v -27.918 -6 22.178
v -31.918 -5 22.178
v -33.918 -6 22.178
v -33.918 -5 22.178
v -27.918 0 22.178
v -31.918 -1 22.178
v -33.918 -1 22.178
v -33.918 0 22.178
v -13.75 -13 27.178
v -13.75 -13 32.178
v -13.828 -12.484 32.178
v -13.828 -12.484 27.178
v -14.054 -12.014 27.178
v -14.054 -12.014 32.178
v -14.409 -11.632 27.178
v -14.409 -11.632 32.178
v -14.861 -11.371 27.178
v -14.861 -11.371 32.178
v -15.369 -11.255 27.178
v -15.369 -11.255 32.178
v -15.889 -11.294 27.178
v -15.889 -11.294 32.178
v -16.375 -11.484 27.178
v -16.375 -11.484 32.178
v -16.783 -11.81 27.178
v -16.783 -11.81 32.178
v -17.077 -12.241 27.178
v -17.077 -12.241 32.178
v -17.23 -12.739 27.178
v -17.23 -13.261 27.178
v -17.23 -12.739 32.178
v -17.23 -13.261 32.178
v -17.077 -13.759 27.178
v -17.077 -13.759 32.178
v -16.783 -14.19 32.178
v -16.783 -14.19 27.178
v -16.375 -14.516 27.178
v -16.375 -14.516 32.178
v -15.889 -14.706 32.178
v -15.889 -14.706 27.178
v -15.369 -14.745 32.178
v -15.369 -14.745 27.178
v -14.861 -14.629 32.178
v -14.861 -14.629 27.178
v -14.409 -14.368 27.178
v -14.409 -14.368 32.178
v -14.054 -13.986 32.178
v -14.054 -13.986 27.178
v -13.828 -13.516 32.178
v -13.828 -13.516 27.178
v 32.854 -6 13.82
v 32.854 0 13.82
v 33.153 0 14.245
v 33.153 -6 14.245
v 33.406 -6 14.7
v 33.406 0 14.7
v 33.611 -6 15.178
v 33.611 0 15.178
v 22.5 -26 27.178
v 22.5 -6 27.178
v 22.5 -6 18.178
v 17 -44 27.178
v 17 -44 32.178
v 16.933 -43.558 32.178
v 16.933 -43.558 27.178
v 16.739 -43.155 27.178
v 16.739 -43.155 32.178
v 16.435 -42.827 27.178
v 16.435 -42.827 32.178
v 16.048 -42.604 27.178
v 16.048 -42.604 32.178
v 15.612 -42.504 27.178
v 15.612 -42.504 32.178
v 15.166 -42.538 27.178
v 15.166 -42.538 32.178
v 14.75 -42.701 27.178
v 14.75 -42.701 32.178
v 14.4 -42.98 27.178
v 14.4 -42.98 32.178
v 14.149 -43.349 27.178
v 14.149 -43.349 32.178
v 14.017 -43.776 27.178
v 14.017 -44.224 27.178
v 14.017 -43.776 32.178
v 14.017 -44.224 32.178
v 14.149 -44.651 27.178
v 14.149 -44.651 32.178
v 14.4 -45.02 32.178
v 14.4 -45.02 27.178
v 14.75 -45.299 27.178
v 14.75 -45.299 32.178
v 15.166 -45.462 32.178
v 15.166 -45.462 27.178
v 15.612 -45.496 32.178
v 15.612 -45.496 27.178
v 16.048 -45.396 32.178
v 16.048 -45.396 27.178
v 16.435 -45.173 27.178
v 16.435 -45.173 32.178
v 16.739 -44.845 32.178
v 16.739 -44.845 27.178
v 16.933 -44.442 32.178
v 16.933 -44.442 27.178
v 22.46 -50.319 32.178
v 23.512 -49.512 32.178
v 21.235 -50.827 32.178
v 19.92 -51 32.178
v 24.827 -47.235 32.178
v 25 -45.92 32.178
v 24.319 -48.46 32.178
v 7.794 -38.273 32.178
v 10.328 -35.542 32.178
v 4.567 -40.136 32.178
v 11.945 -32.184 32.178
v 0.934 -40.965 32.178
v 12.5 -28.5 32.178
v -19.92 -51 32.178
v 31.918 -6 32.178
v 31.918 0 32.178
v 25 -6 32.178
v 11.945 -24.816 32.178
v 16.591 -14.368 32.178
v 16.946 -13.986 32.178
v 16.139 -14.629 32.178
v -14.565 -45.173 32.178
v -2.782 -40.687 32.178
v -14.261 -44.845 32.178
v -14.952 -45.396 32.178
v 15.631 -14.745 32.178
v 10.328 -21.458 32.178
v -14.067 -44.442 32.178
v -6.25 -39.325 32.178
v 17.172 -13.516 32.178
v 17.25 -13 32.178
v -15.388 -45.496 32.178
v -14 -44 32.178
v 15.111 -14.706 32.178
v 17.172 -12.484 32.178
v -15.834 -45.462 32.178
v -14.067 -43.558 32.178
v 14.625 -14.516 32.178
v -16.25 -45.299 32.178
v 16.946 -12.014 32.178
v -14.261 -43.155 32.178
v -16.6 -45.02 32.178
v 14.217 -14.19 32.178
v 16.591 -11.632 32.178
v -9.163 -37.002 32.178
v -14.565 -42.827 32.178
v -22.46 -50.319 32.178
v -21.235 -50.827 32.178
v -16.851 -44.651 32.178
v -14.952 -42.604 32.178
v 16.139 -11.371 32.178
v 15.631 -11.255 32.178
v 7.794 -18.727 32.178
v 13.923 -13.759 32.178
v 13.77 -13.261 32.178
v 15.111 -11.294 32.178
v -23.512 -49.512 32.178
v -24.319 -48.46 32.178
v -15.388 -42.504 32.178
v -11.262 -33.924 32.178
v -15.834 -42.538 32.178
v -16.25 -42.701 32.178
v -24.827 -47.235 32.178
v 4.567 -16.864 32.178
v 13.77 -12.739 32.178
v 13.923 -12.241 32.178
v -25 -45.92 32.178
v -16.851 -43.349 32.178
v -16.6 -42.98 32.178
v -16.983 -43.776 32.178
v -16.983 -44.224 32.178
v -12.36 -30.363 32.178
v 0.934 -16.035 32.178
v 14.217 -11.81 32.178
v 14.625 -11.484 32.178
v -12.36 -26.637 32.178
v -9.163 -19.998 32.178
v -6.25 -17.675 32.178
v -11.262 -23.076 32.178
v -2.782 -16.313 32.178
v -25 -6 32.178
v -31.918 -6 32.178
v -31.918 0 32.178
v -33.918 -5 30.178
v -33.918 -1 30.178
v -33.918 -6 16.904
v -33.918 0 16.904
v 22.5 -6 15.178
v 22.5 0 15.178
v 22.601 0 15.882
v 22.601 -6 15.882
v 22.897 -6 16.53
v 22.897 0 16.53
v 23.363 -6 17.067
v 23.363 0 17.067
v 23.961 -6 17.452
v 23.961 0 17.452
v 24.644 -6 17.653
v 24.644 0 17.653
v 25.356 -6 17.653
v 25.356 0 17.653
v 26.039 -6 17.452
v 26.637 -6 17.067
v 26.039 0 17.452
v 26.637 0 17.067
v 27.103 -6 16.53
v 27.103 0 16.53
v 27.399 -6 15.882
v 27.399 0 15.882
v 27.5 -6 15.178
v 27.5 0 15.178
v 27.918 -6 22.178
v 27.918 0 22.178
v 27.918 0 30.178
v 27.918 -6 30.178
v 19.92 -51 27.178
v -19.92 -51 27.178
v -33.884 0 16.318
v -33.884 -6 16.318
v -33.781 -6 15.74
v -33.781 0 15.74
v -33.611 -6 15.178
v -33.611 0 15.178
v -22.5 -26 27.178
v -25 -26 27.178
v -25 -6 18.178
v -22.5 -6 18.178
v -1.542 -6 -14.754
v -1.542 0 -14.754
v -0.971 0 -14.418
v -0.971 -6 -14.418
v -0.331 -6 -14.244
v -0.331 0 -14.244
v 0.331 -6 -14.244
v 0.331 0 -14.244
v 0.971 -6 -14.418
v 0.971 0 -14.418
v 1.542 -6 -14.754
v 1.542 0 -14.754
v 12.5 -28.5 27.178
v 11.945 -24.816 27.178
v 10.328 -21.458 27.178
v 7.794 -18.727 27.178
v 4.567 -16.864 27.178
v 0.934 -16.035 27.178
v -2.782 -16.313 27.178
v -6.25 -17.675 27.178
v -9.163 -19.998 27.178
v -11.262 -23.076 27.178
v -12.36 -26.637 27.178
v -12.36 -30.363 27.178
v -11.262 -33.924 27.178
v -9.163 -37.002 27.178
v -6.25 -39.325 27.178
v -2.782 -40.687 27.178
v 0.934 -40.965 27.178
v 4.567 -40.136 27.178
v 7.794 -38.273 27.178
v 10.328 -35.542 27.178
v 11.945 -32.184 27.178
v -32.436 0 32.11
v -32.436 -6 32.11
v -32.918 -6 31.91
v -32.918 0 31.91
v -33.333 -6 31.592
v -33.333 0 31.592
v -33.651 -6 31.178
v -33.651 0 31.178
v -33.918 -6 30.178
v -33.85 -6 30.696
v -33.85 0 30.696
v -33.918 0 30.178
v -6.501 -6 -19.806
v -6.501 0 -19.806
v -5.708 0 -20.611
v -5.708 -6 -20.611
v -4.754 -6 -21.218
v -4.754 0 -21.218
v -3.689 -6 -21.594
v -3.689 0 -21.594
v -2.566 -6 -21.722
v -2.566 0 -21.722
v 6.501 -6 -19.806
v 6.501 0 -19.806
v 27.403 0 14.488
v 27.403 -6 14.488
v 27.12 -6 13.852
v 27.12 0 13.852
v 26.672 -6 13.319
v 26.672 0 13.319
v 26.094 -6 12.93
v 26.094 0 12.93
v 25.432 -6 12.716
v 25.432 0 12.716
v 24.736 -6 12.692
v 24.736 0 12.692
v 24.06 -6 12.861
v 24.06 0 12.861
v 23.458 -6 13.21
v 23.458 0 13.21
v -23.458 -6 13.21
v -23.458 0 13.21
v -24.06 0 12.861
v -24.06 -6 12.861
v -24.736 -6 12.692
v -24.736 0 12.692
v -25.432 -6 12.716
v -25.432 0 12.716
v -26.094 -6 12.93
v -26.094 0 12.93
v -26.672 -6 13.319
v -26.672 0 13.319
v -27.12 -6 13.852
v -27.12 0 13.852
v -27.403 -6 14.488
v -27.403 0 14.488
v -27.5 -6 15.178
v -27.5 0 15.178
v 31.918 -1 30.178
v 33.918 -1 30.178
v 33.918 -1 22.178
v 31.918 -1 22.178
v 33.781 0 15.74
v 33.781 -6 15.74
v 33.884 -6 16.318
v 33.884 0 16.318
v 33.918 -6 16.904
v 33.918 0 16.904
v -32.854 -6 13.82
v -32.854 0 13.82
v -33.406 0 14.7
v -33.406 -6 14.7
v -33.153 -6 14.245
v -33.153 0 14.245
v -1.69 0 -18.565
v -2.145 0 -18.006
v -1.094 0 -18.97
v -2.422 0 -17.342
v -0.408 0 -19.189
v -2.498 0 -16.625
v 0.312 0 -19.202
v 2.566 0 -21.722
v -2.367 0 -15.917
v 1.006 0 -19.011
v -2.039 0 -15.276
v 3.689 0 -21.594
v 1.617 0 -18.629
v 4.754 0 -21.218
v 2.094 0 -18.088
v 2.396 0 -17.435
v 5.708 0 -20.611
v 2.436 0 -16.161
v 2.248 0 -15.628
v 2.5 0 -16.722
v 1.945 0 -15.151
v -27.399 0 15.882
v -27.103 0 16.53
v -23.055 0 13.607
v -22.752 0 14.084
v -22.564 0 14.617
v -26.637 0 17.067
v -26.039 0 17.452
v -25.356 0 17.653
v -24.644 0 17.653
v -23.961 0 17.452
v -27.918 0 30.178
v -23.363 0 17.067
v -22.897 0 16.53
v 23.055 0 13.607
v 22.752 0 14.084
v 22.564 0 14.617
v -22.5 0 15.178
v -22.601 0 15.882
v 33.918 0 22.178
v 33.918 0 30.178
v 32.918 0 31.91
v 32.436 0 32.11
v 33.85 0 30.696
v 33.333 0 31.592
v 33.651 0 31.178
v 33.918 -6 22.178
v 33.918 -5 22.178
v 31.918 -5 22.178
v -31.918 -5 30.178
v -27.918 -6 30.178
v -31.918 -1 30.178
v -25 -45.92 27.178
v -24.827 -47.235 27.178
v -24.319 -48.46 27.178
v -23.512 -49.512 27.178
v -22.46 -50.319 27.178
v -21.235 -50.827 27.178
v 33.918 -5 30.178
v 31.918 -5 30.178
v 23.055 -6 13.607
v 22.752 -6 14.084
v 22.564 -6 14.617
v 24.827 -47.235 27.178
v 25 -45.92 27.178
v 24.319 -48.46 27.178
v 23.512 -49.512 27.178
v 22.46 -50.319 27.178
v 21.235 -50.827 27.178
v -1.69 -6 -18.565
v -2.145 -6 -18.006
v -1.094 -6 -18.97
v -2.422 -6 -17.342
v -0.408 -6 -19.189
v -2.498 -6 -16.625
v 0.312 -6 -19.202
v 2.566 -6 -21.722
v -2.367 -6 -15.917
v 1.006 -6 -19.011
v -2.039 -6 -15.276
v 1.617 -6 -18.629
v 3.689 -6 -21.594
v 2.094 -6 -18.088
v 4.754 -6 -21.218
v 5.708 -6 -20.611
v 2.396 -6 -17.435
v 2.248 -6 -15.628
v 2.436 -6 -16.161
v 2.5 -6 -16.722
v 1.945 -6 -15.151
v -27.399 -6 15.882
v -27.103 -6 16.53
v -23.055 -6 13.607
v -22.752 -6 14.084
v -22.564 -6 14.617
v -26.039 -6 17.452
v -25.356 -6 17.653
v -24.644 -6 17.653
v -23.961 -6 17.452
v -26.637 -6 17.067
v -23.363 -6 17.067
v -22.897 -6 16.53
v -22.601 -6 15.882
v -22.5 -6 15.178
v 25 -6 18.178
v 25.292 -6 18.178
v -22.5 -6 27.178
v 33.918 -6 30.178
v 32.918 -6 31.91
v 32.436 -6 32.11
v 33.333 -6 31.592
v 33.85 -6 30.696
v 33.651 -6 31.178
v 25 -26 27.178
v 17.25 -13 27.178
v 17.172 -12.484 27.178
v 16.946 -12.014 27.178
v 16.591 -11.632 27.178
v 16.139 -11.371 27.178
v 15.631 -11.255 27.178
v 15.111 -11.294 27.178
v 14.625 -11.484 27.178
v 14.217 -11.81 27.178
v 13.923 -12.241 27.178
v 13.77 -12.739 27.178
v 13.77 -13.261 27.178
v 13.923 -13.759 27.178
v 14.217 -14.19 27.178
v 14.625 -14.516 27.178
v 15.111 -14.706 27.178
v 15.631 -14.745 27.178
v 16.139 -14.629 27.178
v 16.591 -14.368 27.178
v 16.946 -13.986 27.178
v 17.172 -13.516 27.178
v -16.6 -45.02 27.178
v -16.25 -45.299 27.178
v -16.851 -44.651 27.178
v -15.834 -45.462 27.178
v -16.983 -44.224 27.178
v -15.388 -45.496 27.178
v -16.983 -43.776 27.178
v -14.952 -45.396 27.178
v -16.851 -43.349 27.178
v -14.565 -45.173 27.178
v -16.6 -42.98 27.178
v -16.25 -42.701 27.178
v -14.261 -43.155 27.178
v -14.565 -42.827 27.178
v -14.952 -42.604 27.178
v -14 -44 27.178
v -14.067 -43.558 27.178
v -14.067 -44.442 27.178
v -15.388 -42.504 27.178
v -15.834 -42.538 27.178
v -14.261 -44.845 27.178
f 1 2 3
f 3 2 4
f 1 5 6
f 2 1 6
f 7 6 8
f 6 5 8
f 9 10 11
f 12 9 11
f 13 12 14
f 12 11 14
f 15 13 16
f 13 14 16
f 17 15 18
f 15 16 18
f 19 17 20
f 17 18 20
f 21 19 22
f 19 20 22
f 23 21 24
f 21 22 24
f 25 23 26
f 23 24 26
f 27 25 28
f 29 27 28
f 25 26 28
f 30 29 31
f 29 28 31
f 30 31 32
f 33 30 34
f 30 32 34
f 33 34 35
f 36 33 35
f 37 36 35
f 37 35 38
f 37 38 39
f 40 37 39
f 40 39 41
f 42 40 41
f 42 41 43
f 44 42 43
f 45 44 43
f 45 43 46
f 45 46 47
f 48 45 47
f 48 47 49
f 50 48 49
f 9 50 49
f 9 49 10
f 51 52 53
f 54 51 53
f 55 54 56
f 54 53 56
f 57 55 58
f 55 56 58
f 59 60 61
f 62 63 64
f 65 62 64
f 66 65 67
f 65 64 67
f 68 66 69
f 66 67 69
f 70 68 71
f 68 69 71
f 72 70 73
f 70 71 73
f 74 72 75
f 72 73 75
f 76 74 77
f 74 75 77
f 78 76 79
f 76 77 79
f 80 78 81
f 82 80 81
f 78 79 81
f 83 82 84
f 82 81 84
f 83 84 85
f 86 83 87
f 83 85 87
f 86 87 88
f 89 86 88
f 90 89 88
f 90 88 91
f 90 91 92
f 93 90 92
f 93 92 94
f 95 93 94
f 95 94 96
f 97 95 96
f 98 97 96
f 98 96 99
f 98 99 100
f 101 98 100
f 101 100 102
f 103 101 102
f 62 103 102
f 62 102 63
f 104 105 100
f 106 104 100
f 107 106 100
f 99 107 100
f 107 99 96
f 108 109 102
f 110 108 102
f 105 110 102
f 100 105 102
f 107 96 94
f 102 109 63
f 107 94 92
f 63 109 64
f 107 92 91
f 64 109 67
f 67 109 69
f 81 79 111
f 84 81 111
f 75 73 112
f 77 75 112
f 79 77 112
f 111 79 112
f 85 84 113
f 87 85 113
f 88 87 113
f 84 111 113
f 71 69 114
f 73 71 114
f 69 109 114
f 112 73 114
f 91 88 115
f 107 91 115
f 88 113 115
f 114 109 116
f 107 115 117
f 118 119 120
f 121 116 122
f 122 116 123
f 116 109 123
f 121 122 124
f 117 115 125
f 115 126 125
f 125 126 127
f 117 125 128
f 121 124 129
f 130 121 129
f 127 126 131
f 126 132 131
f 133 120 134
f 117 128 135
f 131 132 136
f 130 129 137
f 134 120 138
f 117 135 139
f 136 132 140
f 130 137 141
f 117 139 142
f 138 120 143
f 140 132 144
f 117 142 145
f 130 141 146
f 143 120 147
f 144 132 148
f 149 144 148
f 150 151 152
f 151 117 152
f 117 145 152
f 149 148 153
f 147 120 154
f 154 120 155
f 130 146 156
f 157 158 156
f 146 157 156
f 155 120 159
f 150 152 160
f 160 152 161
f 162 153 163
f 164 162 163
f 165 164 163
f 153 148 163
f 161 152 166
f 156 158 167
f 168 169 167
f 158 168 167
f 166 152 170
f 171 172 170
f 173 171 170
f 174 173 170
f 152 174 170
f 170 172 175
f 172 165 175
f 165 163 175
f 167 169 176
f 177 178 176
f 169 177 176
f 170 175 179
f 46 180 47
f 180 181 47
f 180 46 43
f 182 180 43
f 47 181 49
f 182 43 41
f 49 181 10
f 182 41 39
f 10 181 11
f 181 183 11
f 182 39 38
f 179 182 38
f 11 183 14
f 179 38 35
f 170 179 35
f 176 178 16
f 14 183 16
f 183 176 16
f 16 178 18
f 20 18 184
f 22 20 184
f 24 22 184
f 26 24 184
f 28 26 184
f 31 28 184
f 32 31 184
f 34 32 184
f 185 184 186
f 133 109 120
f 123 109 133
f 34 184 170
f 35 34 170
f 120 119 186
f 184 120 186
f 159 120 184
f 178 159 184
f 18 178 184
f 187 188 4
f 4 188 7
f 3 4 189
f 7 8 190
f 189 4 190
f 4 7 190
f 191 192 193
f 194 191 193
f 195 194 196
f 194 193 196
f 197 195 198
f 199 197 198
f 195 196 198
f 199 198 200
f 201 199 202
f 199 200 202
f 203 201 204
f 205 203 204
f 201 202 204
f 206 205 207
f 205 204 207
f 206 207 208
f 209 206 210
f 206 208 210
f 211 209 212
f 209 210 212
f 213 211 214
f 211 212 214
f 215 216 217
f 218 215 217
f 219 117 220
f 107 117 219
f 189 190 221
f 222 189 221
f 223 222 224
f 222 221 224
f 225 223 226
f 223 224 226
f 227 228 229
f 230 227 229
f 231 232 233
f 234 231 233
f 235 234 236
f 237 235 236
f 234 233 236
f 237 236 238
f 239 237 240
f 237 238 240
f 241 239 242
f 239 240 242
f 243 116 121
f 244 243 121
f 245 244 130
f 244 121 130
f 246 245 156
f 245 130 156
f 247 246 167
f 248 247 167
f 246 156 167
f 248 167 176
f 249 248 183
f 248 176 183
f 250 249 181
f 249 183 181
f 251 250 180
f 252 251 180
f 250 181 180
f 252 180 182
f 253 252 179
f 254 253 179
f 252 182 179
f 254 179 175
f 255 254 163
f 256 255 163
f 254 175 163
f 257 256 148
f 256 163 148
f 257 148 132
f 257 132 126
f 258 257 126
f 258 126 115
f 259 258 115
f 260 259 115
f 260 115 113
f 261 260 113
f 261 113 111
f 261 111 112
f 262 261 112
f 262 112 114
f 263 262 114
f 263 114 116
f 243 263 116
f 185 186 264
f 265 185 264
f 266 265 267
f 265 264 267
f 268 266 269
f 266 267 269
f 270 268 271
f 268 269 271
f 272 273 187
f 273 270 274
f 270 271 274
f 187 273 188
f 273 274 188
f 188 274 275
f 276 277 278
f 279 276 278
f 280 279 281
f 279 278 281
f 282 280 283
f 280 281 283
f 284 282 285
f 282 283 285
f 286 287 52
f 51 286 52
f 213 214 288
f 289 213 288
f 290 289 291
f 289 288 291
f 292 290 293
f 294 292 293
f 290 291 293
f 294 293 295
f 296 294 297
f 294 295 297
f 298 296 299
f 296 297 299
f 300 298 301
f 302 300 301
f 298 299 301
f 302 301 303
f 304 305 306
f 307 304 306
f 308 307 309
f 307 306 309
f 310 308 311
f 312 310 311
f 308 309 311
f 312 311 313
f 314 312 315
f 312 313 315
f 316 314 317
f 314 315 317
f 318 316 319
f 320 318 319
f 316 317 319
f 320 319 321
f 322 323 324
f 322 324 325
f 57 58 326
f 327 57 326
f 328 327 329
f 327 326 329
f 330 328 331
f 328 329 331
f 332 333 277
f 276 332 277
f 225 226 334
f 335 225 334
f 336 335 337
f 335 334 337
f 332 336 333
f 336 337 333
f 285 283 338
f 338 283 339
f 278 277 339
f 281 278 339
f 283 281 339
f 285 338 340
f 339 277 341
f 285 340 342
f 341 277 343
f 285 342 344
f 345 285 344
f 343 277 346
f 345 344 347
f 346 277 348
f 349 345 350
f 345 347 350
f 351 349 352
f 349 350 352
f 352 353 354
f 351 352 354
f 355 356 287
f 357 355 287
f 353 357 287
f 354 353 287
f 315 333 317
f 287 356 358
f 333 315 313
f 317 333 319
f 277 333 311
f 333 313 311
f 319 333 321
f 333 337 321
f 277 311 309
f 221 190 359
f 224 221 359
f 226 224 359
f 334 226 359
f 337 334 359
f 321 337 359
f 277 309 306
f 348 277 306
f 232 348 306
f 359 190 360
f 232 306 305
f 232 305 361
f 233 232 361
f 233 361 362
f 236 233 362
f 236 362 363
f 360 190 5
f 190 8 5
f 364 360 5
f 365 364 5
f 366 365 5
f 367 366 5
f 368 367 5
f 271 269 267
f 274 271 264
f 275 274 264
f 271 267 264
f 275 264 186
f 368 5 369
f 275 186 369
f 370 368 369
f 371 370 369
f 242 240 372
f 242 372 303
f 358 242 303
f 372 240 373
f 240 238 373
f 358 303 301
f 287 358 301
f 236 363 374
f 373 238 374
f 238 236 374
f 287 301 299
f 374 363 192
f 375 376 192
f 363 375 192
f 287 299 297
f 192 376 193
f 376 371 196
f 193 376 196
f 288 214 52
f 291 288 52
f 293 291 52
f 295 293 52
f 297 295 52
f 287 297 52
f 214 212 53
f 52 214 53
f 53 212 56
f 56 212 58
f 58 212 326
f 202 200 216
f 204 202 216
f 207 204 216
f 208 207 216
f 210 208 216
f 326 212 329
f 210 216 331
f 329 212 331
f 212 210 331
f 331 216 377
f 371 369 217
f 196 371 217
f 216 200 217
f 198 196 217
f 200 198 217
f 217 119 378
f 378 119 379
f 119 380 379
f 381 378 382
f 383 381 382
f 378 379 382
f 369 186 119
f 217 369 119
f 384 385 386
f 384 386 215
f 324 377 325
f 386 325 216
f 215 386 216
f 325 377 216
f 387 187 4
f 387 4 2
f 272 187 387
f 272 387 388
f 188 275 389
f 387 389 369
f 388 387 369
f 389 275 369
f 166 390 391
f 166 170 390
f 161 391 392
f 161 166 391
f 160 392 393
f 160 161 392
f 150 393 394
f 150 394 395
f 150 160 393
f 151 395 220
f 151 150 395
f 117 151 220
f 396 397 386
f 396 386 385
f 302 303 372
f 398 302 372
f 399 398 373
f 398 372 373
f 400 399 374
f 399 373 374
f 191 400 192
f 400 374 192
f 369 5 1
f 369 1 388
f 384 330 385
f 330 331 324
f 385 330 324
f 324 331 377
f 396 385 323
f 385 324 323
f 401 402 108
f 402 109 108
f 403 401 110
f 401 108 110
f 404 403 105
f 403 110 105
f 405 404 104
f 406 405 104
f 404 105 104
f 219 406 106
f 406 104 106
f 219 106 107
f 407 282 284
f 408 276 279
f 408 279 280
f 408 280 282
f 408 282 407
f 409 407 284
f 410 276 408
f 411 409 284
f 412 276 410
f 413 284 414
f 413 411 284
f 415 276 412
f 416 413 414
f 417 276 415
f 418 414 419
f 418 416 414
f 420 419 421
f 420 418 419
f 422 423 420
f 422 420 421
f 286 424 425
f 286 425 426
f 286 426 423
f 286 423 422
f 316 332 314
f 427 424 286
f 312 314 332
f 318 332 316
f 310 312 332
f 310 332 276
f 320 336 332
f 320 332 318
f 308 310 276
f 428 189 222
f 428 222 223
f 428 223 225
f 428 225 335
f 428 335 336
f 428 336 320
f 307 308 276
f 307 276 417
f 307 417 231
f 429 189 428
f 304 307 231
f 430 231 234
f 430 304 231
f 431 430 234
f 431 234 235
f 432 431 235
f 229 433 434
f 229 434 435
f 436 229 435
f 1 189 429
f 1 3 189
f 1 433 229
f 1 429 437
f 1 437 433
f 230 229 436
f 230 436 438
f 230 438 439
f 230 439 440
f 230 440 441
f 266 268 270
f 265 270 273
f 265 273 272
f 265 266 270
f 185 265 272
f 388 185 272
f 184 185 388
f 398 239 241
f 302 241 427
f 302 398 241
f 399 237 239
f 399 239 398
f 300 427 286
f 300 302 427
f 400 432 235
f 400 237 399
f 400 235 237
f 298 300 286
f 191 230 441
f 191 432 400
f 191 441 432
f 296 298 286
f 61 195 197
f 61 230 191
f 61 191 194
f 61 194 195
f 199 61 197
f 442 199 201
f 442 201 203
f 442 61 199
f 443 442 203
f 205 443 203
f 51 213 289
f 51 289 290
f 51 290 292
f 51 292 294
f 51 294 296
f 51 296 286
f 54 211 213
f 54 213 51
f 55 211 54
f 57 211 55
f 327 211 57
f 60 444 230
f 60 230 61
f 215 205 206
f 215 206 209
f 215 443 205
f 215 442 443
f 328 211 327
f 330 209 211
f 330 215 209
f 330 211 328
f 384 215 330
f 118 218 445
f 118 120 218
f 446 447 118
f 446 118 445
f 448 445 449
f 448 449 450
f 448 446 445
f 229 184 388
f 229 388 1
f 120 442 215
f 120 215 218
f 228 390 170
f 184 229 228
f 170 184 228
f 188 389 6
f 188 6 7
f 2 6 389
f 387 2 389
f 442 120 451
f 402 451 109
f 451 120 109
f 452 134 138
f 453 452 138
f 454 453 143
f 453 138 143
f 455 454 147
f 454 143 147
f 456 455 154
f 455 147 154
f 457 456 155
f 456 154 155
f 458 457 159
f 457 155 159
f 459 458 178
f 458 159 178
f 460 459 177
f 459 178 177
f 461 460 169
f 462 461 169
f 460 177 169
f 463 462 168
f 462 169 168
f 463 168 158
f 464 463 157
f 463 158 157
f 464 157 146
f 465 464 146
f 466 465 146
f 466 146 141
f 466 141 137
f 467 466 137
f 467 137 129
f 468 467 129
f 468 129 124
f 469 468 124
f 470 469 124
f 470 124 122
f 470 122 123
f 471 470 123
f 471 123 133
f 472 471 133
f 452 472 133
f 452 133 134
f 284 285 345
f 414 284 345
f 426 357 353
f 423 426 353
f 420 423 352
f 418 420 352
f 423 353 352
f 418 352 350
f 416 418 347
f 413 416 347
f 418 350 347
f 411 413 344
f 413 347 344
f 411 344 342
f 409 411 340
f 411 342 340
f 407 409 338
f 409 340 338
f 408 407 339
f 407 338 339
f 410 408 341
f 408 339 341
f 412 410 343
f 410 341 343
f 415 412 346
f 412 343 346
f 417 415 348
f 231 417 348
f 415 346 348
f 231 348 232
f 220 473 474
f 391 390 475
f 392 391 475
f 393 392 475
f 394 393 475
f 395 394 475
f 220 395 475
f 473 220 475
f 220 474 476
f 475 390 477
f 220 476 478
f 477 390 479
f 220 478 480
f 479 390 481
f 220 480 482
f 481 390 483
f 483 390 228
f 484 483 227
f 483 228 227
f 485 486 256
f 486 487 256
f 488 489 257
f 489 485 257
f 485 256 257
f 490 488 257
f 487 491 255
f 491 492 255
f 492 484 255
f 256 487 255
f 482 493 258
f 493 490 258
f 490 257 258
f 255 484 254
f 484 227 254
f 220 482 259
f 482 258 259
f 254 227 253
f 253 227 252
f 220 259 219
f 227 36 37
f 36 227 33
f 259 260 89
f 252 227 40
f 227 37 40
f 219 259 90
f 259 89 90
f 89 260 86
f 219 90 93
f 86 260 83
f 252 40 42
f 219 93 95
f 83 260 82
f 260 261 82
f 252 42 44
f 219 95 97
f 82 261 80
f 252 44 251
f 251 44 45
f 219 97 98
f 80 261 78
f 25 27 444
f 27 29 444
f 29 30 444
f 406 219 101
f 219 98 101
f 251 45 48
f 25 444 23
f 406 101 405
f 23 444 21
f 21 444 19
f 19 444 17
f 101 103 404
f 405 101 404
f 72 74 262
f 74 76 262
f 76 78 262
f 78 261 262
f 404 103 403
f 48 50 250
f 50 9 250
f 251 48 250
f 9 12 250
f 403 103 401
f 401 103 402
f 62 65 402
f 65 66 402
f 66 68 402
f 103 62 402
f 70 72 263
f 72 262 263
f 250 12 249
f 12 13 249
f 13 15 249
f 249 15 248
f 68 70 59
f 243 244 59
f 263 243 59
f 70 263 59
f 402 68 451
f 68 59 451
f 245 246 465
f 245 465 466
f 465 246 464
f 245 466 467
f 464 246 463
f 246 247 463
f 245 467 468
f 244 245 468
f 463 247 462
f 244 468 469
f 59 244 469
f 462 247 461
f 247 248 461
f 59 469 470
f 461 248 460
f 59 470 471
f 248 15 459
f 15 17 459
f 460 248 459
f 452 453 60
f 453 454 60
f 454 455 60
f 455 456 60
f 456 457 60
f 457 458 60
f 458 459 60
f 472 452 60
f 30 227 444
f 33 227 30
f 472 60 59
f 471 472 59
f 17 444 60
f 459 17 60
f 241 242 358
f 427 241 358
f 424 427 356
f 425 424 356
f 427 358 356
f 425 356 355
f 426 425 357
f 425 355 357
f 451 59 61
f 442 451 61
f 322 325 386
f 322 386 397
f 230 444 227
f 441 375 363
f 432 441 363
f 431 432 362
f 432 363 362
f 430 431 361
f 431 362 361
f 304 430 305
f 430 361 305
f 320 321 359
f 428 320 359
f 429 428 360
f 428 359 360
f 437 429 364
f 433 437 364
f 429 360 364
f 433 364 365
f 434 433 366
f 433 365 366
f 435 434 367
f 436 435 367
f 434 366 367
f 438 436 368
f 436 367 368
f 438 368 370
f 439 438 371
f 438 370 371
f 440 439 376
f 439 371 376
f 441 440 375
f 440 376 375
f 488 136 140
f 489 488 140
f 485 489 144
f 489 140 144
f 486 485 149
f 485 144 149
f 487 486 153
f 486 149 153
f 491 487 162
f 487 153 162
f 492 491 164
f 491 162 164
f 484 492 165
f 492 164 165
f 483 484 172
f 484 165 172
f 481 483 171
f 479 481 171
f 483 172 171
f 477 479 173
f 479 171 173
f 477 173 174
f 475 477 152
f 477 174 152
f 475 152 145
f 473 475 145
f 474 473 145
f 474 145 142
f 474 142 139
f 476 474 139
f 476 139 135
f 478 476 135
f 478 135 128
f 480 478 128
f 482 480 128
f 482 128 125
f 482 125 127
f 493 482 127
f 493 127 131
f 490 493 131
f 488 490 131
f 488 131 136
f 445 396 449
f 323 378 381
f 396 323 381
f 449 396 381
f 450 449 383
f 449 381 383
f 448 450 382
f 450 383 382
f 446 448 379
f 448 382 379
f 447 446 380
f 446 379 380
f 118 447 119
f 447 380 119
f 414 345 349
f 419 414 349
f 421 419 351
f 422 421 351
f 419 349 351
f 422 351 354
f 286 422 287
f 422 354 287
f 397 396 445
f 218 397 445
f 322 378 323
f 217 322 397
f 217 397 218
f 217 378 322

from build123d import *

# Parameters (mm, degrees)
F0_W      = 4
F0_H      = 8
F0_W_2    = 2
F1_DEPTH  = 6
F2_W      = 2
F2_H      = 8
F3_DEPTH  = 1
F4_W      = 2
F4_H      = 8
F5_DEPTH  = 1
F6_W      = 25
F6_H      = 5
F7_DEPTH  = 45
F8_R      = 5.08
F9_W      = 2.5
F9_H      = 20
F10_DEPTH = 9
F12_DEPTH = 50.292
F13_R     = 12.5
F13_R_2   = 1.75
F13_R_3   = 1.5
F14_DEPTH = 25.4


# Not quite as in the source:
# - a feature names something its author has since deleted; it is built from what else it names


with BuildPart() as f1:
    # F0 (on Front) → F1 (new body)
    with BuildSketch(Plane.XZ):
        with BuildLine():
            Line((-22.5, 15.1779663801), (-15.95, 15.1779663801))
            Line((-15.95, 15.1779663801), (15.95, 15.1779663801))
            Line((15.95, 15.1779663801), (22.5, 15.1779663801))
            ThreePointArc((22.5, 15.1779663801), (25, 17.6779663801), (27.5, 15.1779663801))
            Line((27.5, 15.1779663801), (33.6112053721, 15.1779663801))
            ThreePointArc((33.6112053721, 15.1779663801), (33.8410734014, 16.027307097), (33.9184952978, 16.9037914461))
            Line((33.9184952978, 16.9037914461), (33.9184952978, 19.2973875134))
            Line((33.9184952978, 19.2973875134), (33.9184952978, 20.1779663801))
            Line((33.9184952978, 20.1779663801), (33.0379164311, 20.1779663801))
            Line((33.0379164311, 20.1779663801), (-32.6408470514, 20.1779663801))
            Line((-32.6408470514, 20.1779663801), (-33.9184952978, 20.1779663801))
            Line((-33.9184952978, 20.1779663801), (-33.9184952978, 18.9003181337))
            Line((-33.9184952978, 18.9003181337), (-33.9184952978, 16.9037914461))
            ThreePointArc((-33.9184952978, 16.9037914461), (-33.8410734014, 16.027307097), (-33.6112053721, 15.1779663801))
            Line((-33.6112053721, 15.1779663801), (-27.5, 15.1779663801))
            ThreePointArc((-27.5, 15.1779663801), (-25, 17.6779663801), (-22.5, 15.1779663801))
        make_face()
        with BuildLine():
            Line((15.95, 15.1779663801), (-15.95, 15.1779663801))
            Line((-15.95, 15.1779663801), (-22.5, 15.1779663801))
            ThreePointArc((-22.5, 15.1779663801), (-22.7521952698, 14.0837205691), (-23.457899116, 13.2102456521))
            Line((-23.457899116, 13.2102456521), (-1.542100884, -14.7543128919))
            ThreePointArc((-1.542100884, -14.7543128919), (0, -14.2220336199), (1.542100884, -14.7543128919))
            Line((1.542100884, -14.7543128919), (23.457899116, 13.2102456521))
            ThreePointArc((23.457899116, 13.2102456521), (22.7521952698, 14.0837205691), (22.5, 15.1779663801))
            Line((22.5, 15.1779663801), (15.95, 15.1779663801))
        make_face()
        with BuildLine():
            ThreePointArc((-23.457899116, 13.2102456521), (-26.094245811, 12.9301616499), (-27.5, 15.1779663801))
            Line((-27.5, 15.1779663801), (-33.6112053721, 15.1779663801))
            ThreePointArc((-33.6112053721, 15.1779663801), (-33.28570797, 14.4691552359), (-32.8539367538, 13.819589678))
            Line((-32.8539367538, 13.819589678), (-6.5014092727, -19.8062353879))
            ThreePointArc((-6.5014092727, -19.8062353879), (-4.7544594387, -21.2176430802), (-2.5659678166, -21.7220336199))
            Line((-2.5659678166, -21.7220336199), (0, -21.7220336199))
            Line((0, -21.7220336199), (0, -19.2220336199))
            ThreePointArc((0, -19.2220336199), (-2.3631866008, -17.5377229541), (-1.542100884, -14.7543128919))
            Line((-1.542100884, -14.7543128919), (-23.457899116, 13.2102456521))
        make_face()
        with BuildLine():
            Line((33.6112053721, 15.1779663801), (27.5, 15.1779663801))
            ThreePointArc((27.5, 15.1779663801), (26.094245811, 12.9301616499), (23.457899116, 13.2102456521))
            Line((23.457899116, 13.2102456521), (1.542100884, -14.7543128919))
            ThreePointArc((1.542100884, -14.7543128919), (2.2478047302, -15.6277878088), (2.5, -16.7220336199))
            ThreePointArc((2.5, -16.7220336199), (1.767766953, -18.4898005728), (0, -19.2220336199))
            Line((0, -19.2220336199), (0, -21.7220336199))
            Line((0, -21.7220336199), (2.5659678166, -21.7220336199))
            ThreePointArc((2.5659678166, -21.7220336199), (4.7544594387, -21.2176430802), (6.5014092727, -19.8062353879))
            Line((6.5014092727, -19.8062353879), (32.8539367538, 13.819589678))
            ThreePointArc((32.8539367538, 13.819589678), (33.28570797, 14.4691552359), (33.6112053721, 15.1779663801))
        make_face()
        with BuildLine():
            Line((-33.9184952978, 30.1779663801), (-33.9184952978, 20.1779663801))
            Line((-33.9184952978, 20.1779663801), (-32.6408470514, 20.1779663801))
            Line((-32.6408470514, 20.1779663801), (33.0379164311, 20.1779663801))
            Line((33.0379164311, 20.1779663801), (33.9184952978, 20.1779663801))
            Line((33.9184952978, 20.1779663801), (33.9184952978, 22.1779663801))
            Line((33.9184952978, 22.1779663801), (31.9184952978, 22.1779663801))
            Line((31.9184952978, 22.1779663801), (27.9184952978, 22.1779663801))
            Line((27.9184952978, 22.1779663801), (27.9184952978, 30.1779663801))
            Line((27.9184952978, 30.1779663801), (31.9184952978, 30.1779663801))
            Line((31.9184952978, 30.1779663801), (33.9184952978, 30.1779663801))
            ThreePointArc((33.9184952978, 30.1779663801), (33.3327088602, 31.5921799425), (31.9184952978, 32.1779663801))
            Line((31.9184952978, 32.1779663801), (-31.9184952978, 32.1779663801))
            ThreePointArc((-31.9184952978, 32.1779663801), (-33.3327088602, 31.5921799425), (-33.9184952978, 30.1779663801))
        make_face()
        with Locations((-29.9184952978, 26.1779663801)):
            Rectangle(F0_W, F0_H, mode=Mode.SUBTRACT)
        with Locations((32.9184952978, 26.1779663801)):
            Rectangle(F0_W_2, F0_H)
    extrude(amount=F1_DEPTH)

    # F2 (on face) → F3 (cut)
    with BuildSketch(Plane(origin=(0, 0, 0), x_dir=(-1, 0, 0), z_dir=(0, 1, 0))):
        with Locations((-32.9184952978, 26.1779663801)):
            Rectangle(F2_W, F2_H)
        with Locations((32.9184952978, 26.1779663801)):
            Rectangle(F2_W, F2_H)
    extrude(amount=-F3_DEPTH, mode=Mode.SUBTRACT)

    # F4 (on face) → F5 (cut)
    with BuildSketch(Plane.XZ.offset(6)):
        with Locations((-32.9184952978, 26.1779663801)):
            Rectangle(F4_W, F4_H)
        with Locations((32.9184952978, 26.1779663801)):
            Rectangle(F4_W, F4_H)
    extrude(amount=-F5_DEPTH, mode=Mode.SUBTRACT)

    # F6 (on face) → F7 (join)
    with BuildSketch(Plane.XZ.offset(6)):
        with Locations((-12.5, 29.6779663801)):
            Rectangle(F6_W, F6_H)
        with Locations((12.5, 29.6779663801)):
            Rectangle(F6_W, F6_H)
    extrude(amount=F7_DEPTH)

    # F8
    f8_edges = [f1.edges().sort_by_distance(p)[0] for p in [
        (25, -51, 29.677966),
        (-25, -51, 29.677966),
    ]]
    fillet(f8_edges, radius=F8_R)

    # F9 (on face) → F10 (join)
    with BuildSketch(Plane(origin=(0, 0, 27.1779663801), x_dir=(1, 0, 0), z_dir=(0, 0, -1))):
        with Locations((23.75, 16)):
            Rectangle(F9_W, F9_H)
        with Locations((-23.75, 16)):
            Rectangle(F9_W, F9_H)
    extrude(amount=F10_DEPTH)

    # F11 (on face) → F12 (cut)
    with BuildSketch(Plane(origin=(-25, 0, 0), x_dir=(0, -1, 0), z_dir=(-1, 0, 0))):
        Polygon((26, 27.1779663801), (6, 18.1779663801), (26, 18.1779663801), align=None)
    extrude(amount=-F12_DEPTH, mode=Mode.SUBTRACT)

    # F13 (on face) → F14 (cut)
    with BuildSketch(Plane.XY.offset(32.1779663801)):
        with Locations((0, -28.5)):
            Circle(F13_R)
        with Locations((-15.5, -13)):
            Circle(F13_R_2)
        with Locations((15.5, -13)):
            Circle(F13_R_2)
        with Locations((15.5, -44)):
            Circle(F13_R_3)
        with Locations((-15.5, -44)):
            Circle(F13_R_3)
    extrude(amount=-F14_DEPTH, mode=Mode.SUBTRACT)


solid = f1.part
